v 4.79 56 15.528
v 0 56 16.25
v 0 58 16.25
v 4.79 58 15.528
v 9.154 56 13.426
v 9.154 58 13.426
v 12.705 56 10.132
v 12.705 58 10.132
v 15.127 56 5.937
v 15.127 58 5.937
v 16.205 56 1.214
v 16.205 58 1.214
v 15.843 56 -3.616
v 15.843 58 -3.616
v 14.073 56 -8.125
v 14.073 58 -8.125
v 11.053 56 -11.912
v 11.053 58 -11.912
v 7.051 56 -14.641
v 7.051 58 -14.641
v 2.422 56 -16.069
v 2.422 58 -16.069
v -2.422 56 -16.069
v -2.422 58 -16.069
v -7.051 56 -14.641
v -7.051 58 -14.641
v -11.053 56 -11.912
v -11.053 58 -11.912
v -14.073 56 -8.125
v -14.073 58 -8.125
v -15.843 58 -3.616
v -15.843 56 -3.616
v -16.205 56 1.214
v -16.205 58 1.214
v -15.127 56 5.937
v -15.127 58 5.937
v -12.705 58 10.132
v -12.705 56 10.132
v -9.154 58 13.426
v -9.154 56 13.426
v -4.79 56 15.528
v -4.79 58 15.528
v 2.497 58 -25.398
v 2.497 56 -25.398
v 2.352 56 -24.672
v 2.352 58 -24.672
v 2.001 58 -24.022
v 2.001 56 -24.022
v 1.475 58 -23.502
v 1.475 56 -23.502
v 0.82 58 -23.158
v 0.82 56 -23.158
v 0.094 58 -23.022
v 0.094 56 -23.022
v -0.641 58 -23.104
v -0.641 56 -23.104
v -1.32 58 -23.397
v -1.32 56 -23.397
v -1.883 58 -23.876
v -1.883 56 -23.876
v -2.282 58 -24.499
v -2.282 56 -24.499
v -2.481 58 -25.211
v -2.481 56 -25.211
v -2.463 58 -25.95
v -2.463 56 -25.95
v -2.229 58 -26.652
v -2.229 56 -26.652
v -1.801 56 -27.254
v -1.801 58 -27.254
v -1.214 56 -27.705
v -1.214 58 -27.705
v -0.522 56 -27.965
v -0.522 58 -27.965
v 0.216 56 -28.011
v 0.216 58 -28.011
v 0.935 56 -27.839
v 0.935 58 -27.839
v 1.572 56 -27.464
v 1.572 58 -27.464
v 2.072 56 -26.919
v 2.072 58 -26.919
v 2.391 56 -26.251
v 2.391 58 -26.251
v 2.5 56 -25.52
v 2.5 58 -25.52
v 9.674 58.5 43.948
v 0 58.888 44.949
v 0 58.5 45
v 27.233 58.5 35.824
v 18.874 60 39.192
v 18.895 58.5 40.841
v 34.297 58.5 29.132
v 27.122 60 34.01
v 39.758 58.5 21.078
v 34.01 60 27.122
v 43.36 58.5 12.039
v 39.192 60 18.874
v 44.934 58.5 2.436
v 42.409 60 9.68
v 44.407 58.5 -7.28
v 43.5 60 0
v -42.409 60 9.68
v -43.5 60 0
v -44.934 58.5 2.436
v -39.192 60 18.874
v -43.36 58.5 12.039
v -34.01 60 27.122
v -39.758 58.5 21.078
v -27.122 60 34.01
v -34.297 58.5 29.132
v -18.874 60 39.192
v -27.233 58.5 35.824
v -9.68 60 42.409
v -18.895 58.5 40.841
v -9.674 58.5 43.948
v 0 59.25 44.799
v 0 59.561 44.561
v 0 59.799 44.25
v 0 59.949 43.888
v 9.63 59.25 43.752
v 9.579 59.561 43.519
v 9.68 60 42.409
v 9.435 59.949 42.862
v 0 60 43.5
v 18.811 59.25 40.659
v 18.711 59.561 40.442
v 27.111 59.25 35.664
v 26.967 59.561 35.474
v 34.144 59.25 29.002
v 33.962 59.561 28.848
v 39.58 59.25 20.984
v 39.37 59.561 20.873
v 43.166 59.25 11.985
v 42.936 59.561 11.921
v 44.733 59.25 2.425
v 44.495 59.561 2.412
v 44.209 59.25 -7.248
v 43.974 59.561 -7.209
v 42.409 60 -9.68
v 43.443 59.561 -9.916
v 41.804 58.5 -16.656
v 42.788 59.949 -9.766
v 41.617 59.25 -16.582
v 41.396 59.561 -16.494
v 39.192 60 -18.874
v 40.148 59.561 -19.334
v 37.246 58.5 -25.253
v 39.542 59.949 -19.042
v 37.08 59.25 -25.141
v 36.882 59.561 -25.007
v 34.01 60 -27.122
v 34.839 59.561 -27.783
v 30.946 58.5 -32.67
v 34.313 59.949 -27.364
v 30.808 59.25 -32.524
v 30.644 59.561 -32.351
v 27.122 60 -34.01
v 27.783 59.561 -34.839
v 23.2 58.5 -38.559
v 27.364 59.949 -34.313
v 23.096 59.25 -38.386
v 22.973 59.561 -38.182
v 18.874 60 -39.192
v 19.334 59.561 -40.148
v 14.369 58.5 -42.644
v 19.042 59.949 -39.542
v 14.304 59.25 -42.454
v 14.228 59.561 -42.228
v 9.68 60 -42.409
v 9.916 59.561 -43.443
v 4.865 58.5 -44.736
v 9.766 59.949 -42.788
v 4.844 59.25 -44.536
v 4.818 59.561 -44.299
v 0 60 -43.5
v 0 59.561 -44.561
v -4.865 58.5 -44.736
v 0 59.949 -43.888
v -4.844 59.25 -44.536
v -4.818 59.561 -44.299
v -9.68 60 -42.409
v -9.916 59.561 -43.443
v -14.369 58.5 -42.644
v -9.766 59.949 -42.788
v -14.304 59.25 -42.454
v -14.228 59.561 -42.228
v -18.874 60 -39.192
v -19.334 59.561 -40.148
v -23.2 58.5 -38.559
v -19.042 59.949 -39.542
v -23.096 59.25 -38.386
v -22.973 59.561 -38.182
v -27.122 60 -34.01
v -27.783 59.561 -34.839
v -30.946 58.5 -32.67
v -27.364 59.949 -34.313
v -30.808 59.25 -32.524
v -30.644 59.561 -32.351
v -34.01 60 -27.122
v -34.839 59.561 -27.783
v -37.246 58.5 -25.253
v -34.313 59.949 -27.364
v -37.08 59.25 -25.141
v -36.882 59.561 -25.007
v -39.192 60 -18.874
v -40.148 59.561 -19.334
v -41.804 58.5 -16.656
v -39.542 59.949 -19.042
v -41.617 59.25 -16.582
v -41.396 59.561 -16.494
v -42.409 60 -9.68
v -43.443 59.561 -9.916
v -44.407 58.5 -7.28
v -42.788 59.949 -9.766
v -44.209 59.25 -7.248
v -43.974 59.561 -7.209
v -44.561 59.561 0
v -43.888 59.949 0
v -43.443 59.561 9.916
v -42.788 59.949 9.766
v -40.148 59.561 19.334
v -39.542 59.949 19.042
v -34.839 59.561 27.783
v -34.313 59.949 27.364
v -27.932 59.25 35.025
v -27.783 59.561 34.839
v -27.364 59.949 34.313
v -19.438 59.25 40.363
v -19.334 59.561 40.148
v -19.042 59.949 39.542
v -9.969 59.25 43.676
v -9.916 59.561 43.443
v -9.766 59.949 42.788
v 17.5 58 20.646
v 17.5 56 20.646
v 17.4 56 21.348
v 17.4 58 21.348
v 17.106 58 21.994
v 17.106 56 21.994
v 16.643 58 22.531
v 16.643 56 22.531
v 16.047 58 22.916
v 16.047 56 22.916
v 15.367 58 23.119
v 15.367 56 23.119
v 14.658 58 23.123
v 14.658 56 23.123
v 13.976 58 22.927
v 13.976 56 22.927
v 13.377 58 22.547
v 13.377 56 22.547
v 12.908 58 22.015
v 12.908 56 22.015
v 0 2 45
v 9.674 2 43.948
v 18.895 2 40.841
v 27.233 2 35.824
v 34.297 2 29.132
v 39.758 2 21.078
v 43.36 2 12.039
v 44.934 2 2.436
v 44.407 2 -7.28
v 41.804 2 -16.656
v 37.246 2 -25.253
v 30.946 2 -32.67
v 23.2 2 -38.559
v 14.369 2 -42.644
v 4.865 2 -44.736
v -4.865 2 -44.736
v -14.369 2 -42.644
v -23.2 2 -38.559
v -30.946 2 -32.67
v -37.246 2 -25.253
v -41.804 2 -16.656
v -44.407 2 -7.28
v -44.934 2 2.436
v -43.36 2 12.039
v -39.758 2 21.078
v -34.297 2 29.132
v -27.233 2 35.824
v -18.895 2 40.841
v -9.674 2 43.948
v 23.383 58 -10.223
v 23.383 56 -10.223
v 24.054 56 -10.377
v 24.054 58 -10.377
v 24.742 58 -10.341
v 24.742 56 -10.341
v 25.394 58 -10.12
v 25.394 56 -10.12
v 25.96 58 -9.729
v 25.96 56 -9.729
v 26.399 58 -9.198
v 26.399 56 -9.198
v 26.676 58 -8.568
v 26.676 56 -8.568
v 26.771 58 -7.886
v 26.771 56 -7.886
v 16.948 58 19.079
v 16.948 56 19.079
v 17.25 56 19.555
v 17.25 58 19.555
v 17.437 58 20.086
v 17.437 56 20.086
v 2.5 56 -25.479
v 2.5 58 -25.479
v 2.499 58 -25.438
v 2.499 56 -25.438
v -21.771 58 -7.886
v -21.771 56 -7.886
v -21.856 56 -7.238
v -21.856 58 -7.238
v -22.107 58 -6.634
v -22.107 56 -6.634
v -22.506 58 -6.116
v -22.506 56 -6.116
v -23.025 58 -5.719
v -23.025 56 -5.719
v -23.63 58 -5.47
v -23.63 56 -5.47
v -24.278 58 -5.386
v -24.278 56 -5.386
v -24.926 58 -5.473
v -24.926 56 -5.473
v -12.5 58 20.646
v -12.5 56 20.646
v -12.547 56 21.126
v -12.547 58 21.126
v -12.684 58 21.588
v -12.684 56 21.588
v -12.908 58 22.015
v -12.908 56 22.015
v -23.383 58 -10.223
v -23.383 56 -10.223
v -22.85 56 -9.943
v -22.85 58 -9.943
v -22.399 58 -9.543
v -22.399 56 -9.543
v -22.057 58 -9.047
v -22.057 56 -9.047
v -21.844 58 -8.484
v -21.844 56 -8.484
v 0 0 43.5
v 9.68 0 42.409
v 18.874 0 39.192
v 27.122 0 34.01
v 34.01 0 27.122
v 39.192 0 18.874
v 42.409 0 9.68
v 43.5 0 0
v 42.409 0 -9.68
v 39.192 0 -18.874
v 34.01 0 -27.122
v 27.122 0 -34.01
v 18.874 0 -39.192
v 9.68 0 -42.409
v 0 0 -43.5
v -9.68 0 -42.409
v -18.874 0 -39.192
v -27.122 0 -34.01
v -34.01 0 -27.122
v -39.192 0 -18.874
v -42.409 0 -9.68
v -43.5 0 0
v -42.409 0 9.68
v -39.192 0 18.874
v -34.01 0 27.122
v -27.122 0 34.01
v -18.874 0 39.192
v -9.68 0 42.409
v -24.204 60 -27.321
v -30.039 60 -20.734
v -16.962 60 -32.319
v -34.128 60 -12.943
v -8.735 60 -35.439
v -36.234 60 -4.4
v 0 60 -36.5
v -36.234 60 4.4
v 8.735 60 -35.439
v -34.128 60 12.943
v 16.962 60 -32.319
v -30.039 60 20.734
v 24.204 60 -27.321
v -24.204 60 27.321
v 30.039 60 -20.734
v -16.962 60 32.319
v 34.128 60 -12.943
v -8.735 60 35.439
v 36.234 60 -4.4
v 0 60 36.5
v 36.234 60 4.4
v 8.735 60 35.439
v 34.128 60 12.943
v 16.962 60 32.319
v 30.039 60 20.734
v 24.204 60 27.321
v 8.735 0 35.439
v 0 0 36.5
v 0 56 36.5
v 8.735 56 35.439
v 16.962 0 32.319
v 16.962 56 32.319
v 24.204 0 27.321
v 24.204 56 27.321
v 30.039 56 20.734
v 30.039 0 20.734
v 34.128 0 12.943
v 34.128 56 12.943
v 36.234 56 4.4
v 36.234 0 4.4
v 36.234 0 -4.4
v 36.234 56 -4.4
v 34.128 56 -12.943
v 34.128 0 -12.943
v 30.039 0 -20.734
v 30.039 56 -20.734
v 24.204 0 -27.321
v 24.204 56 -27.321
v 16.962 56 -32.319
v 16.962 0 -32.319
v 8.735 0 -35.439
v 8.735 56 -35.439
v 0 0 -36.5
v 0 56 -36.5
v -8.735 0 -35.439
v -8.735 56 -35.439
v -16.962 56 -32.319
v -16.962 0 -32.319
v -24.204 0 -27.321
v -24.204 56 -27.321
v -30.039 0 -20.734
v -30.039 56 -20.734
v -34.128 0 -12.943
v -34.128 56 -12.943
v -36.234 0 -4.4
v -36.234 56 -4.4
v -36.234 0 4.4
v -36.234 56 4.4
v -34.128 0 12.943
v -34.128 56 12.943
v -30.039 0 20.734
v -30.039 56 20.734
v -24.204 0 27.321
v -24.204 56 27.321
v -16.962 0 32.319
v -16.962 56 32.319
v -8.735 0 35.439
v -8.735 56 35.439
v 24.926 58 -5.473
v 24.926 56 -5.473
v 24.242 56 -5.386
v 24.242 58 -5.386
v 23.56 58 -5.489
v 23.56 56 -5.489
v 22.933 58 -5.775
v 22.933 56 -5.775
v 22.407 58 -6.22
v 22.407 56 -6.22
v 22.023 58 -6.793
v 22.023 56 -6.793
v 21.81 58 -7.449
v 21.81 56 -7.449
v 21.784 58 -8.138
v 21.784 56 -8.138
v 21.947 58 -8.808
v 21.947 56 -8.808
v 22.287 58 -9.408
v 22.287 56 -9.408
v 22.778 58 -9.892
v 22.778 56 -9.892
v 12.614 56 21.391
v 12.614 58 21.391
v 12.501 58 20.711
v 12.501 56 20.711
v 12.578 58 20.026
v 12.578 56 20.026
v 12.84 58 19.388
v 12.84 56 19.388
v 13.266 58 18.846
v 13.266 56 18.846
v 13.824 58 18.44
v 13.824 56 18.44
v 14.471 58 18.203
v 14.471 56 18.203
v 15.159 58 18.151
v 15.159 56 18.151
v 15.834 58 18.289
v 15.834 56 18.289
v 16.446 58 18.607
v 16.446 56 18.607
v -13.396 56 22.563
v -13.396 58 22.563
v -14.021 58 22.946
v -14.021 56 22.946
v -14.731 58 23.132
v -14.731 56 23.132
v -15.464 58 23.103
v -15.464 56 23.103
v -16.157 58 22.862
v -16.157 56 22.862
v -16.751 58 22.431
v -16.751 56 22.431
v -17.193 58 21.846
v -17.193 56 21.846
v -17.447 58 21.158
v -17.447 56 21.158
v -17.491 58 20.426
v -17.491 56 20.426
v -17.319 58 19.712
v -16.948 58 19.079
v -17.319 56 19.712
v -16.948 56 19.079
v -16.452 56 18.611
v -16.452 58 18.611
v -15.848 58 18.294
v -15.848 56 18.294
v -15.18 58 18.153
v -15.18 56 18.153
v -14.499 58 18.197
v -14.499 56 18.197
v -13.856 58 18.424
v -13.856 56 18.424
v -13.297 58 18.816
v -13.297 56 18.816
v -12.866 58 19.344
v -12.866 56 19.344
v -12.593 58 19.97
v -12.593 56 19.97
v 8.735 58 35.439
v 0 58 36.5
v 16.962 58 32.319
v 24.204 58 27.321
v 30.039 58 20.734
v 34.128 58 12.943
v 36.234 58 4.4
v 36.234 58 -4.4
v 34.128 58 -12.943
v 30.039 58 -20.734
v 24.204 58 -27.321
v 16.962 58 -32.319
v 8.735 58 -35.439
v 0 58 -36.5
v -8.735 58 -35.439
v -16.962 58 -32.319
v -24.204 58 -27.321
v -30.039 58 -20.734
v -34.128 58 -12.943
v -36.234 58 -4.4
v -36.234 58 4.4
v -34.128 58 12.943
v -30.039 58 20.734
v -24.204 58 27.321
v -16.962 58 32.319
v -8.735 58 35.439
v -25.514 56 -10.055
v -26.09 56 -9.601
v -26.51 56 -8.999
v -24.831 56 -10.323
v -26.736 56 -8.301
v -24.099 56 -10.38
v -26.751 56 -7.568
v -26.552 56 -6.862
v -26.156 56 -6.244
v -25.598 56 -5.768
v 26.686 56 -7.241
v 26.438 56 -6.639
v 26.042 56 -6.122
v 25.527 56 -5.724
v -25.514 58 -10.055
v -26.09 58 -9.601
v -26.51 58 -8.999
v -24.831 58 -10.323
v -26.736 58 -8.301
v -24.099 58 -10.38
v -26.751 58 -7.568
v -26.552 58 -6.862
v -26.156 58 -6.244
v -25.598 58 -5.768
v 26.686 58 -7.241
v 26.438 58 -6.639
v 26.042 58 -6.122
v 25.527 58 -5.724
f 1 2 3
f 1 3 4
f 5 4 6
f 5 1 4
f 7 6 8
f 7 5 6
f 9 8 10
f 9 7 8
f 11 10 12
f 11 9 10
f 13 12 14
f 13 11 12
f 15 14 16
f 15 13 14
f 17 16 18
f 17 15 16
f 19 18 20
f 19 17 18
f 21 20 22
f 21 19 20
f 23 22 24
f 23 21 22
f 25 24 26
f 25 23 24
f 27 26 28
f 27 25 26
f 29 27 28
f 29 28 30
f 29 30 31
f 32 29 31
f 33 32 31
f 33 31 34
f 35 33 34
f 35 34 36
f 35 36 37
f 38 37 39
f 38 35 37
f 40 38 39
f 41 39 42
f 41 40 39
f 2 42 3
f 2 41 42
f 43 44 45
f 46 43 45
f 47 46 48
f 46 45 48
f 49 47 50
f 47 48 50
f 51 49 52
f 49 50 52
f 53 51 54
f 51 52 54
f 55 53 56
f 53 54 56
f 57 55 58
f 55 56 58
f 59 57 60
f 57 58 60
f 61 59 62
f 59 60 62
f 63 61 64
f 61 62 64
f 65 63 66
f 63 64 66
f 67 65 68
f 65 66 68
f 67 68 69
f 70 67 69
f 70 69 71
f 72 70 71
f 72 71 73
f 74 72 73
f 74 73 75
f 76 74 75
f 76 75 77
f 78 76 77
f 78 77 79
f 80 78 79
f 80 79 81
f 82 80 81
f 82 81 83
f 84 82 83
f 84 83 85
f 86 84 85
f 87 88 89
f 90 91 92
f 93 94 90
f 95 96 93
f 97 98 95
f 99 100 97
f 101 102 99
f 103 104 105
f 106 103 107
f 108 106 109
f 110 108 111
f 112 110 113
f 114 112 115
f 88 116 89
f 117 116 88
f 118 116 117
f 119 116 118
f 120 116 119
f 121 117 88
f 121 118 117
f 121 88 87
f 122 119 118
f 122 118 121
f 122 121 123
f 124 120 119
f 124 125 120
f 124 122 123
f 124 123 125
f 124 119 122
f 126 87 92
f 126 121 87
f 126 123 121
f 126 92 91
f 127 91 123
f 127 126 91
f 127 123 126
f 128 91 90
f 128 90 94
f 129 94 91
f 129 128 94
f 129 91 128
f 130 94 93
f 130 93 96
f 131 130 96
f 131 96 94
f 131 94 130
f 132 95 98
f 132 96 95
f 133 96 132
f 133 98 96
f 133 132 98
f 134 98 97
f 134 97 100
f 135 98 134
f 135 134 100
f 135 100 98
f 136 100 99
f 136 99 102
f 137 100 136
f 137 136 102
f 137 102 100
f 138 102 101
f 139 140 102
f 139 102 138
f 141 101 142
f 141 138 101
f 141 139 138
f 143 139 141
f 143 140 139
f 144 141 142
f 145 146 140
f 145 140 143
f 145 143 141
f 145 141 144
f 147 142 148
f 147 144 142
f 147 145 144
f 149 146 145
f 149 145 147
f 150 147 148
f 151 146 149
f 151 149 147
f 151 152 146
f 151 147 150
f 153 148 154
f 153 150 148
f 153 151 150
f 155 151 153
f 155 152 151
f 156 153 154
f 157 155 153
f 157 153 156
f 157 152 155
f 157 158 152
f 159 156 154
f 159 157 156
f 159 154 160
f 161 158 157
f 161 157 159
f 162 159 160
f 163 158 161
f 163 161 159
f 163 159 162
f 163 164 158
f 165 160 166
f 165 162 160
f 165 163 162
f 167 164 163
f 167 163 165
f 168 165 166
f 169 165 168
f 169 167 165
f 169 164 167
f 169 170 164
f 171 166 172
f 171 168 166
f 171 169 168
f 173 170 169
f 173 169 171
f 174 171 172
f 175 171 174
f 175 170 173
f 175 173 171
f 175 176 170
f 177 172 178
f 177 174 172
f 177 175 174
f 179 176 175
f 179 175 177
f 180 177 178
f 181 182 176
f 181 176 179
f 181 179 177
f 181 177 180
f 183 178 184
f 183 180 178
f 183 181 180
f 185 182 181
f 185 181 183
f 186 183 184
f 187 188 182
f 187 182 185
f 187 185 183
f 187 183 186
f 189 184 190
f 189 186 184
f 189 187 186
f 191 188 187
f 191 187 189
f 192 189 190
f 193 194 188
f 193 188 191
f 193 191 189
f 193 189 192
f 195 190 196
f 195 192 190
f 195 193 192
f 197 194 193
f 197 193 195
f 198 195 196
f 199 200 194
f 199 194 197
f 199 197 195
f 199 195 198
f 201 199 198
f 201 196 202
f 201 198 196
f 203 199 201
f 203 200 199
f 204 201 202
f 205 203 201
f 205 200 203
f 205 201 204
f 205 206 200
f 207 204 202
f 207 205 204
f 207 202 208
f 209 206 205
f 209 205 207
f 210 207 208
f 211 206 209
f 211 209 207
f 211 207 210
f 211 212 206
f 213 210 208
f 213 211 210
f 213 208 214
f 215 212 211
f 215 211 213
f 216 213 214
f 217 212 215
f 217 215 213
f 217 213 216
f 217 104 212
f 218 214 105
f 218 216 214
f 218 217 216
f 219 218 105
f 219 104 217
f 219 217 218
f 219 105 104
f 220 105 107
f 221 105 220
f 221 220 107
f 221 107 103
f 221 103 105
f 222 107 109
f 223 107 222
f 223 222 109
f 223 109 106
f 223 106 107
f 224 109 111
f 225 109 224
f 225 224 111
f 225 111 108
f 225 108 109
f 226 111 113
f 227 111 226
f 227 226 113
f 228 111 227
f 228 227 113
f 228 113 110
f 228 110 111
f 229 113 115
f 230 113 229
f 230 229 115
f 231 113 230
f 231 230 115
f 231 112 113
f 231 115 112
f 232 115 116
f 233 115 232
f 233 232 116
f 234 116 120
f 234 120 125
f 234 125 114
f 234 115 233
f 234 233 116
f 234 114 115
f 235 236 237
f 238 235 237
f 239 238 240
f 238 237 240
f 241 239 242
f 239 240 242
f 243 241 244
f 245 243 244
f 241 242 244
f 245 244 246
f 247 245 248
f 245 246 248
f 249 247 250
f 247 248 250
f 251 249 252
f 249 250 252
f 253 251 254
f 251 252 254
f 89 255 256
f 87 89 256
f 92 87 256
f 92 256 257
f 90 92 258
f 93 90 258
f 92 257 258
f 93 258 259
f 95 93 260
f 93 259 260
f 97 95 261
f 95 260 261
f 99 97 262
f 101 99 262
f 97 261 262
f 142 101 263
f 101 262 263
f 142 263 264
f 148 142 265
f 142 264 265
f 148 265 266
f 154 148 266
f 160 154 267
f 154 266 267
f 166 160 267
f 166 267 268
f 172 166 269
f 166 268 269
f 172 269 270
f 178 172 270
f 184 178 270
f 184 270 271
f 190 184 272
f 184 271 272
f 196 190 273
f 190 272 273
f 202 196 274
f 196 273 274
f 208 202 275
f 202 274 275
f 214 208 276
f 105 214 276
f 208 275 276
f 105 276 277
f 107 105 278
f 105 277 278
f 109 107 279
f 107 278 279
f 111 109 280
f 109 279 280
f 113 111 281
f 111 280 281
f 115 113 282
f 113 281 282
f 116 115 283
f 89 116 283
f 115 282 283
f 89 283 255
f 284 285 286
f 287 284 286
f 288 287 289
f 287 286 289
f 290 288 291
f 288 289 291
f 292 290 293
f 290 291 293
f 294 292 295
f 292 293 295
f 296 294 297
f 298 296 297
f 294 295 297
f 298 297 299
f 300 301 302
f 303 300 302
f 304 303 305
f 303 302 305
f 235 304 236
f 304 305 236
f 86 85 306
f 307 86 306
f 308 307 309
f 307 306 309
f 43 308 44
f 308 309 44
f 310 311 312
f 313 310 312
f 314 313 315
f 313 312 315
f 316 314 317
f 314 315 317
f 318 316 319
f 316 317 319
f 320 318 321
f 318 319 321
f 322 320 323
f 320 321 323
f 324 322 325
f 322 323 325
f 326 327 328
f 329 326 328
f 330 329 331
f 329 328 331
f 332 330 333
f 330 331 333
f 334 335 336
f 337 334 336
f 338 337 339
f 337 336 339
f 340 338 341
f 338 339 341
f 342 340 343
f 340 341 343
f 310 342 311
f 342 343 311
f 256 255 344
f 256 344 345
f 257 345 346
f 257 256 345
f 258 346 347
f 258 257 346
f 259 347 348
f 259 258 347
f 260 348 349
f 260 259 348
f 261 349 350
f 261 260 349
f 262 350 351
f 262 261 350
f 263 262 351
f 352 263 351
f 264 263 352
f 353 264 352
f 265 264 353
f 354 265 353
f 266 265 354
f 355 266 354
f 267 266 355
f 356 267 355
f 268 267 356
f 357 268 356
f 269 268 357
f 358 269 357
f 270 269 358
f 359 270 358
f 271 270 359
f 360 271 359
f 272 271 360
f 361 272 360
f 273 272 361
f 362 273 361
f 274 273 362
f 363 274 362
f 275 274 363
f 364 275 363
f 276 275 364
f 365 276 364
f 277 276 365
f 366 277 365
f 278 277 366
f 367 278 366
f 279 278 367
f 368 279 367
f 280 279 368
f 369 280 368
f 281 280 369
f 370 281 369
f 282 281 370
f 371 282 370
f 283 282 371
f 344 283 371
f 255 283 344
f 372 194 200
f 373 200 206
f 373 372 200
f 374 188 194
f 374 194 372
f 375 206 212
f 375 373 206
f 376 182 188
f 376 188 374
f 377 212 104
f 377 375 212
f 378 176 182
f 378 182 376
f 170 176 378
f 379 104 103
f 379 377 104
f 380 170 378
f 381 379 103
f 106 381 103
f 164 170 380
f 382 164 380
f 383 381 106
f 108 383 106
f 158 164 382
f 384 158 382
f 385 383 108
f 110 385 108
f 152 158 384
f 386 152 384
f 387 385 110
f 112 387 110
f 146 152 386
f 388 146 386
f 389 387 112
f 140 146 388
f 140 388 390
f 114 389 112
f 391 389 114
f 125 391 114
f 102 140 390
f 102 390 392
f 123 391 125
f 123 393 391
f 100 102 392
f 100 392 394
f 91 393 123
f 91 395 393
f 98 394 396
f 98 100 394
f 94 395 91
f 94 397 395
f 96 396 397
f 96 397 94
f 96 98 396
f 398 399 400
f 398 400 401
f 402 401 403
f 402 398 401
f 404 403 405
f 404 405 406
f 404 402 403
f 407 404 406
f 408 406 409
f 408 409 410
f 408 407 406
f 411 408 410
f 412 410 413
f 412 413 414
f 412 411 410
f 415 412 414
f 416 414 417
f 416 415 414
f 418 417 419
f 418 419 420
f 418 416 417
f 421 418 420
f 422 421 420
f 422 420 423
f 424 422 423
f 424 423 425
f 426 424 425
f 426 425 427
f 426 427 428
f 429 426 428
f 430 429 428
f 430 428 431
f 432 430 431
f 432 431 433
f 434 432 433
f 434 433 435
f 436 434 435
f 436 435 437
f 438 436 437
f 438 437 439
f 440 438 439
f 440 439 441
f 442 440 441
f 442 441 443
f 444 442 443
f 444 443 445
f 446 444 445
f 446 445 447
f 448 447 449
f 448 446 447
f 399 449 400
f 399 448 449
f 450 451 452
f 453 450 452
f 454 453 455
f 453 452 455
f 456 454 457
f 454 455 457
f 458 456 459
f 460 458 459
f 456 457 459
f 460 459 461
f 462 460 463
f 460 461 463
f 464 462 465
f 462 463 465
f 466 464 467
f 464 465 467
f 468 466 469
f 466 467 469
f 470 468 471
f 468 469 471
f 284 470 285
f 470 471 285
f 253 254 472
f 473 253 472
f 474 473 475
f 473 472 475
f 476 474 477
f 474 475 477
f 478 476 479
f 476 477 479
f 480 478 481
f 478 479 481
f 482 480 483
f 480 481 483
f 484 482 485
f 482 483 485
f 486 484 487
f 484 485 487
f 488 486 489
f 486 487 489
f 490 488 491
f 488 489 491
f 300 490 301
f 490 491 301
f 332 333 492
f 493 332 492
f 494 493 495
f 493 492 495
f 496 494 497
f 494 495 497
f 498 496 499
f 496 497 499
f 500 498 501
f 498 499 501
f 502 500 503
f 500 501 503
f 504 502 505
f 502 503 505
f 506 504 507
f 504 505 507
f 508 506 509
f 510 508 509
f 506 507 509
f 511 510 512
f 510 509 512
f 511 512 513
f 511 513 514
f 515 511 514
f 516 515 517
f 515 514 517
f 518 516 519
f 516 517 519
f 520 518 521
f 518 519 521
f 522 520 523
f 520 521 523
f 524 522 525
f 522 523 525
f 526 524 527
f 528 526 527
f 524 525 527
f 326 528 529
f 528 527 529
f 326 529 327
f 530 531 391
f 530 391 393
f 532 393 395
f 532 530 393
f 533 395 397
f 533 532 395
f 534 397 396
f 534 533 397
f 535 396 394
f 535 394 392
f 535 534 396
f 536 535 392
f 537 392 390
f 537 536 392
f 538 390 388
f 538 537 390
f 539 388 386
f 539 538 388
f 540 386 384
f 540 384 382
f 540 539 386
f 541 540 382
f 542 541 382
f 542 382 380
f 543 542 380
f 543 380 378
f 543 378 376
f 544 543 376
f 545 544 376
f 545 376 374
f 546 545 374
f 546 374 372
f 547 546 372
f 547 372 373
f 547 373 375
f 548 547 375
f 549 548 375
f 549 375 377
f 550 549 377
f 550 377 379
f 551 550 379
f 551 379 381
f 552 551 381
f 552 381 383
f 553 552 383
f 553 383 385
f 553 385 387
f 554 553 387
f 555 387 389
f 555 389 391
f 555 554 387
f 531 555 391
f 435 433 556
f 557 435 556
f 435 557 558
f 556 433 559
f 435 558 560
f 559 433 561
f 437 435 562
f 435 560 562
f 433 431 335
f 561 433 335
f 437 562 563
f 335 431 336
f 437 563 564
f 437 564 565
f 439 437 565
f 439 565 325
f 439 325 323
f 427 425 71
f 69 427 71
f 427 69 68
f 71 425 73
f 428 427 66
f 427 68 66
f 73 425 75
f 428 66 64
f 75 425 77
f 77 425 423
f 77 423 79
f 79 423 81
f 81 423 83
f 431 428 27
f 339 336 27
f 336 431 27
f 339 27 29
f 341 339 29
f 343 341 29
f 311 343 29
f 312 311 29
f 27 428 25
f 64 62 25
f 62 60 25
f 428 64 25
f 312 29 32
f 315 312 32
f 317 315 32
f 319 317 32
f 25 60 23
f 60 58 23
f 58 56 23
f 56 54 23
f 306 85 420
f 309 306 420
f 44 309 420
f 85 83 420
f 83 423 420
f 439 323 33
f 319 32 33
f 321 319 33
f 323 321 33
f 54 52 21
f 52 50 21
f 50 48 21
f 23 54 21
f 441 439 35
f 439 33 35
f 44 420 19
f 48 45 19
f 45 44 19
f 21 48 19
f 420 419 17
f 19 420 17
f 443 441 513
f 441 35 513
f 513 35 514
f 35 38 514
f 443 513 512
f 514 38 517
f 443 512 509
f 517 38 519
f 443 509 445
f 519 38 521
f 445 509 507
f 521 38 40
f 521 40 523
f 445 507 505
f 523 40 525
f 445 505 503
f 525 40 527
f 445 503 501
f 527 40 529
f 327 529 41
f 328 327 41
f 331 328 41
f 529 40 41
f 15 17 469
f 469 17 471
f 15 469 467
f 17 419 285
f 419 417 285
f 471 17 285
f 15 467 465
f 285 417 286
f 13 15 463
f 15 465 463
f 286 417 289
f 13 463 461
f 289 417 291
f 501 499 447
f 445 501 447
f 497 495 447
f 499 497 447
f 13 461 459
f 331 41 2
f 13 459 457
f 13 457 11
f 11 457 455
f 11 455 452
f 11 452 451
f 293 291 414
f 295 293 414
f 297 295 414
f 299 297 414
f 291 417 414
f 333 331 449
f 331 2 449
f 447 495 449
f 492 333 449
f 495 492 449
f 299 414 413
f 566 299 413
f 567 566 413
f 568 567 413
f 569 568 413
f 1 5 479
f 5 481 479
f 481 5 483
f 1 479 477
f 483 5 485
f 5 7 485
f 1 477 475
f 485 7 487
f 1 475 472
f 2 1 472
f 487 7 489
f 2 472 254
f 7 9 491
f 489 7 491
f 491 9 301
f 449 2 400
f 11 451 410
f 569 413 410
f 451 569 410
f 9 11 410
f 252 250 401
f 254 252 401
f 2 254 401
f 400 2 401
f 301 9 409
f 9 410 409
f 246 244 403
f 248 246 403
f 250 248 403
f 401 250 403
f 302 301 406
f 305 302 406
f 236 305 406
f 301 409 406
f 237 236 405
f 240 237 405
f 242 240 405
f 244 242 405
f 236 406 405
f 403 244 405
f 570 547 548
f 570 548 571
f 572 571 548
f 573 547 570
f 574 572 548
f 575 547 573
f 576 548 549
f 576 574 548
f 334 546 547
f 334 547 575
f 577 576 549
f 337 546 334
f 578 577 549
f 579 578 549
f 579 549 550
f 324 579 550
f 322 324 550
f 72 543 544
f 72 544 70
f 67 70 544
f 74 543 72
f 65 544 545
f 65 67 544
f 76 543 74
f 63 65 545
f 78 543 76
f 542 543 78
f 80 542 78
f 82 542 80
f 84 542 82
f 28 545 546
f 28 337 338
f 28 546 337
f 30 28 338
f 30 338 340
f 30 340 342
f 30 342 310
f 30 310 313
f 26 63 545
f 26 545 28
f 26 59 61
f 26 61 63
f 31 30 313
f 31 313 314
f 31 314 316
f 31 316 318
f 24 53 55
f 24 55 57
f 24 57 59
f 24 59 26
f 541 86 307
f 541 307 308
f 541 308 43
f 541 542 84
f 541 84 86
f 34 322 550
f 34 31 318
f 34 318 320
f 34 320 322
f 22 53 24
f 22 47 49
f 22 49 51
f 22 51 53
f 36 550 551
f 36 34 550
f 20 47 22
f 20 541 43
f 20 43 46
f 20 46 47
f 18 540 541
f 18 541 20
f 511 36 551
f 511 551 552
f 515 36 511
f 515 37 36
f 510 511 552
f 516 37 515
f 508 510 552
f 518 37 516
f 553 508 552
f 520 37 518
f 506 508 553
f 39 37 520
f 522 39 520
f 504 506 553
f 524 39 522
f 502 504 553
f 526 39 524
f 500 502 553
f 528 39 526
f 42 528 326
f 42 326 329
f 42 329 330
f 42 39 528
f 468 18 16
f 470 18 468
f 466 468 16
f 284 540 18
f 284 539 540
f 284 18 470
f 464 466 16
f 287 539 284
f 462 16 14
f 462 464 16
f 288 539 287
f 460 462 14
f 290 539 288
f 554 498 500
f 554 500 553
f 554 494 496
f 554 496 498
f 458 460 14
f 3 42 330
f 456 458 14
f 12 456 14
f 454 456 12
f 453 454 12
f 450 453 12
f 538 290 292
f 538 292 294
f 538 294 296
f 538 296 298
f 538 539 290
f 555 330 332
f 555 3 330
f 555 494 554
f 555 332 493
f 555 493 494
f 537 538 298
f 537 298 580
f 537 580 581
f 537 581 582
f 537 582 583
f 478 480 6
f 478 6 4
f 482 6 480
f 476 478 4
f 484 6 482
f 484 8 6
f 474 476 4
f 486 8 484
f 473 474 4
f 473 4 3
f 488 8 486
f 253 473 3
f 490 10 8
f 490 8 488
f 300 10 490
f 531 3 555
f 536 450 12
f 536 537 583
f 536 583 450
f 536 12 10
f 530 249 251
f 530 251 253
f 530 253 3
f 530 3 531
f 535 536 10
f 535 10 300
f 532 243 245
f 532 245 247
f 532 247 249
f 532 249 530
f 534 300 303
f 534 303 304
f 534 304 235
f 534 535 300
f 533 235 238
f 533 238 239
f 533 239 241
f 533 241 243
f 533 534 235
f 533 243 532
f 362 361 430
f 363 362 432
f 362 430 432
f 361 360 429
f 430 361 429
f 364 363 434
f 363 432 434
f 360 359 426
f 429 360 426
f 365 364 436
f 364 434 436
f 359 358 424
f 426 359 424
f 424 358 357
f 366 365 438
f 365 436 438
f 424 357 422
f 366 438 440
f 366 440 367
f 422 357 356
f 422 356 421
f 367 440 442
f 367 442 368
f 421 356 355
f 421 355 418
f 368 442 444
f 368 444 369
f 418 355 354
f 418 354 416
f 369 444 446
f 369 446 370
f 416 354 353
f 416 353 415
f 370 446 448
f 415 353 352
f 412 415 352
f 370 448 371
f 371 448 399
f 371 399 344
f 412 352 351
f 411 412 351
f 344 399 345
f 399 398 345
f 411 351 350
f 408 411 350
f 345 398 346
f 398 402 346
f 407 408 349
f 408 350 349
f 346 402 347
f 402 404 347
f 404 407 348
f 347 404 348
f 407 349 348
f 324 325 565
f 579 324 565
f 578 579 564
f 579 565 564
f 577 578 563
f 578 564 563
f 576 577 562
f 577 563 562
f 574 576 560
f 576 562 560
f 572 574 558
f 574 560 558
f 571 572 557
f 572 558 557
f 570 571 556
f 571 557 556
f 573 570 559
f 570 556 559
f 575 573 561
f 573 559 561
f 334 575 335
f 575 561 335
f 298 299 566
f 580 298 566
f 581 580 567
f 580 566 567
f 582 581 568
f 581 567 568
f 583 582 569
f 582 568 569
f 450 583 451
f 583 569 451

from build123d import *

# Parameters (mm, degrees)
SKETCH3_R           = 45
SKETCH3_R_2         = 36.5
BOSS_EXTRUDE1_DEPTH = 60
FILLET1_R           = 1.5
BOSS_EXTRUDE3_START = 56
SKETCH3_6_R         = 36.5
SKETCH3_6_R_2       = 2.5
SKETCH3_6_R_3       = 16.25
BOSS_EXTRUDE3_DEPTH = 2
CHAMFER2_SIZE       = 1.5
CHAMFER2_SIZE2      = 2


with BuildPart() as part:
    # Sketch3 → Boss-Extrude1 (new body)
    with BuildSketch(Plane(origin=(0, 0, 0), x_dir=(1, 0, 0), z_dir=(0, 1, 0))):
        Circle(SKETCH3_R)
        Circle(SKETCH3_R_2, mode=Mode.SUBTRACT)
    extrude(amount=BOSS_EXTRUDE1_DEPTH)

    # Fillet1
    fillet1_edges = [part.edges().sort_by_distance(p)[0] for p in [
        (-45, 60, 0),
    ]]
    fillet(fillet1_edges, radius=FILLET1_R)

    # Sketch3<6> → Boss-Extrude3 (add)
    with BuildSketch(Plane(origin=(0, 0, 0), x_dir=(1, 0, 0), z_dir=(0, 1, 0)).offset(BOSS_EXTRUDE3_START)):
        Circle(SKETCH3_6_R)
        with Locations((-15.000279639, -20.646113696)):
            Circle(SKETCH3_6_R_2, mode=Mode.SUBTRACT)
        with Locations((15.000279639, -20.646113696)):
            Circle(SKETCH3_6_R_2, mode=Mode.SUBTRACT)
        with Locations((-24.270962296, 7.886113696)):
            Circle(SKETCH3_6_R_2, mode=Mode.SUBTRACT)
        Circle(SKETCH3_6_R_3, mode=Mode.SUBTRACT)
        with Locations((24.270962296, 7.886113696)):
            Circle(SKETCH3_6_R_2, mode=Mode.SUBTRACT)
        with Locations((0, 25.52)):
            Circle(SKETCH3_6_R_2, mode=Mode.SUBTRACT)
    extrude(amount=BOSS_EXTRUDE3_DEPTH)

    # Chamfer2
    chamfer2_edges = [part.edges().sort_by_distance(p)[0] for p in [
        (-45, 0, 0),
    ]]
    chamfer2_side = [part.faces().sort_by_distance(p)[0] for p in [
        (-43.727207794, 0, 0),
    ]]
    chamfer(chamfer2_edges, length=CHAMFER2_SIZE, length2=CHAMFER2_SIZE2, reference=chamfer2_side[0])


solid = part.part
